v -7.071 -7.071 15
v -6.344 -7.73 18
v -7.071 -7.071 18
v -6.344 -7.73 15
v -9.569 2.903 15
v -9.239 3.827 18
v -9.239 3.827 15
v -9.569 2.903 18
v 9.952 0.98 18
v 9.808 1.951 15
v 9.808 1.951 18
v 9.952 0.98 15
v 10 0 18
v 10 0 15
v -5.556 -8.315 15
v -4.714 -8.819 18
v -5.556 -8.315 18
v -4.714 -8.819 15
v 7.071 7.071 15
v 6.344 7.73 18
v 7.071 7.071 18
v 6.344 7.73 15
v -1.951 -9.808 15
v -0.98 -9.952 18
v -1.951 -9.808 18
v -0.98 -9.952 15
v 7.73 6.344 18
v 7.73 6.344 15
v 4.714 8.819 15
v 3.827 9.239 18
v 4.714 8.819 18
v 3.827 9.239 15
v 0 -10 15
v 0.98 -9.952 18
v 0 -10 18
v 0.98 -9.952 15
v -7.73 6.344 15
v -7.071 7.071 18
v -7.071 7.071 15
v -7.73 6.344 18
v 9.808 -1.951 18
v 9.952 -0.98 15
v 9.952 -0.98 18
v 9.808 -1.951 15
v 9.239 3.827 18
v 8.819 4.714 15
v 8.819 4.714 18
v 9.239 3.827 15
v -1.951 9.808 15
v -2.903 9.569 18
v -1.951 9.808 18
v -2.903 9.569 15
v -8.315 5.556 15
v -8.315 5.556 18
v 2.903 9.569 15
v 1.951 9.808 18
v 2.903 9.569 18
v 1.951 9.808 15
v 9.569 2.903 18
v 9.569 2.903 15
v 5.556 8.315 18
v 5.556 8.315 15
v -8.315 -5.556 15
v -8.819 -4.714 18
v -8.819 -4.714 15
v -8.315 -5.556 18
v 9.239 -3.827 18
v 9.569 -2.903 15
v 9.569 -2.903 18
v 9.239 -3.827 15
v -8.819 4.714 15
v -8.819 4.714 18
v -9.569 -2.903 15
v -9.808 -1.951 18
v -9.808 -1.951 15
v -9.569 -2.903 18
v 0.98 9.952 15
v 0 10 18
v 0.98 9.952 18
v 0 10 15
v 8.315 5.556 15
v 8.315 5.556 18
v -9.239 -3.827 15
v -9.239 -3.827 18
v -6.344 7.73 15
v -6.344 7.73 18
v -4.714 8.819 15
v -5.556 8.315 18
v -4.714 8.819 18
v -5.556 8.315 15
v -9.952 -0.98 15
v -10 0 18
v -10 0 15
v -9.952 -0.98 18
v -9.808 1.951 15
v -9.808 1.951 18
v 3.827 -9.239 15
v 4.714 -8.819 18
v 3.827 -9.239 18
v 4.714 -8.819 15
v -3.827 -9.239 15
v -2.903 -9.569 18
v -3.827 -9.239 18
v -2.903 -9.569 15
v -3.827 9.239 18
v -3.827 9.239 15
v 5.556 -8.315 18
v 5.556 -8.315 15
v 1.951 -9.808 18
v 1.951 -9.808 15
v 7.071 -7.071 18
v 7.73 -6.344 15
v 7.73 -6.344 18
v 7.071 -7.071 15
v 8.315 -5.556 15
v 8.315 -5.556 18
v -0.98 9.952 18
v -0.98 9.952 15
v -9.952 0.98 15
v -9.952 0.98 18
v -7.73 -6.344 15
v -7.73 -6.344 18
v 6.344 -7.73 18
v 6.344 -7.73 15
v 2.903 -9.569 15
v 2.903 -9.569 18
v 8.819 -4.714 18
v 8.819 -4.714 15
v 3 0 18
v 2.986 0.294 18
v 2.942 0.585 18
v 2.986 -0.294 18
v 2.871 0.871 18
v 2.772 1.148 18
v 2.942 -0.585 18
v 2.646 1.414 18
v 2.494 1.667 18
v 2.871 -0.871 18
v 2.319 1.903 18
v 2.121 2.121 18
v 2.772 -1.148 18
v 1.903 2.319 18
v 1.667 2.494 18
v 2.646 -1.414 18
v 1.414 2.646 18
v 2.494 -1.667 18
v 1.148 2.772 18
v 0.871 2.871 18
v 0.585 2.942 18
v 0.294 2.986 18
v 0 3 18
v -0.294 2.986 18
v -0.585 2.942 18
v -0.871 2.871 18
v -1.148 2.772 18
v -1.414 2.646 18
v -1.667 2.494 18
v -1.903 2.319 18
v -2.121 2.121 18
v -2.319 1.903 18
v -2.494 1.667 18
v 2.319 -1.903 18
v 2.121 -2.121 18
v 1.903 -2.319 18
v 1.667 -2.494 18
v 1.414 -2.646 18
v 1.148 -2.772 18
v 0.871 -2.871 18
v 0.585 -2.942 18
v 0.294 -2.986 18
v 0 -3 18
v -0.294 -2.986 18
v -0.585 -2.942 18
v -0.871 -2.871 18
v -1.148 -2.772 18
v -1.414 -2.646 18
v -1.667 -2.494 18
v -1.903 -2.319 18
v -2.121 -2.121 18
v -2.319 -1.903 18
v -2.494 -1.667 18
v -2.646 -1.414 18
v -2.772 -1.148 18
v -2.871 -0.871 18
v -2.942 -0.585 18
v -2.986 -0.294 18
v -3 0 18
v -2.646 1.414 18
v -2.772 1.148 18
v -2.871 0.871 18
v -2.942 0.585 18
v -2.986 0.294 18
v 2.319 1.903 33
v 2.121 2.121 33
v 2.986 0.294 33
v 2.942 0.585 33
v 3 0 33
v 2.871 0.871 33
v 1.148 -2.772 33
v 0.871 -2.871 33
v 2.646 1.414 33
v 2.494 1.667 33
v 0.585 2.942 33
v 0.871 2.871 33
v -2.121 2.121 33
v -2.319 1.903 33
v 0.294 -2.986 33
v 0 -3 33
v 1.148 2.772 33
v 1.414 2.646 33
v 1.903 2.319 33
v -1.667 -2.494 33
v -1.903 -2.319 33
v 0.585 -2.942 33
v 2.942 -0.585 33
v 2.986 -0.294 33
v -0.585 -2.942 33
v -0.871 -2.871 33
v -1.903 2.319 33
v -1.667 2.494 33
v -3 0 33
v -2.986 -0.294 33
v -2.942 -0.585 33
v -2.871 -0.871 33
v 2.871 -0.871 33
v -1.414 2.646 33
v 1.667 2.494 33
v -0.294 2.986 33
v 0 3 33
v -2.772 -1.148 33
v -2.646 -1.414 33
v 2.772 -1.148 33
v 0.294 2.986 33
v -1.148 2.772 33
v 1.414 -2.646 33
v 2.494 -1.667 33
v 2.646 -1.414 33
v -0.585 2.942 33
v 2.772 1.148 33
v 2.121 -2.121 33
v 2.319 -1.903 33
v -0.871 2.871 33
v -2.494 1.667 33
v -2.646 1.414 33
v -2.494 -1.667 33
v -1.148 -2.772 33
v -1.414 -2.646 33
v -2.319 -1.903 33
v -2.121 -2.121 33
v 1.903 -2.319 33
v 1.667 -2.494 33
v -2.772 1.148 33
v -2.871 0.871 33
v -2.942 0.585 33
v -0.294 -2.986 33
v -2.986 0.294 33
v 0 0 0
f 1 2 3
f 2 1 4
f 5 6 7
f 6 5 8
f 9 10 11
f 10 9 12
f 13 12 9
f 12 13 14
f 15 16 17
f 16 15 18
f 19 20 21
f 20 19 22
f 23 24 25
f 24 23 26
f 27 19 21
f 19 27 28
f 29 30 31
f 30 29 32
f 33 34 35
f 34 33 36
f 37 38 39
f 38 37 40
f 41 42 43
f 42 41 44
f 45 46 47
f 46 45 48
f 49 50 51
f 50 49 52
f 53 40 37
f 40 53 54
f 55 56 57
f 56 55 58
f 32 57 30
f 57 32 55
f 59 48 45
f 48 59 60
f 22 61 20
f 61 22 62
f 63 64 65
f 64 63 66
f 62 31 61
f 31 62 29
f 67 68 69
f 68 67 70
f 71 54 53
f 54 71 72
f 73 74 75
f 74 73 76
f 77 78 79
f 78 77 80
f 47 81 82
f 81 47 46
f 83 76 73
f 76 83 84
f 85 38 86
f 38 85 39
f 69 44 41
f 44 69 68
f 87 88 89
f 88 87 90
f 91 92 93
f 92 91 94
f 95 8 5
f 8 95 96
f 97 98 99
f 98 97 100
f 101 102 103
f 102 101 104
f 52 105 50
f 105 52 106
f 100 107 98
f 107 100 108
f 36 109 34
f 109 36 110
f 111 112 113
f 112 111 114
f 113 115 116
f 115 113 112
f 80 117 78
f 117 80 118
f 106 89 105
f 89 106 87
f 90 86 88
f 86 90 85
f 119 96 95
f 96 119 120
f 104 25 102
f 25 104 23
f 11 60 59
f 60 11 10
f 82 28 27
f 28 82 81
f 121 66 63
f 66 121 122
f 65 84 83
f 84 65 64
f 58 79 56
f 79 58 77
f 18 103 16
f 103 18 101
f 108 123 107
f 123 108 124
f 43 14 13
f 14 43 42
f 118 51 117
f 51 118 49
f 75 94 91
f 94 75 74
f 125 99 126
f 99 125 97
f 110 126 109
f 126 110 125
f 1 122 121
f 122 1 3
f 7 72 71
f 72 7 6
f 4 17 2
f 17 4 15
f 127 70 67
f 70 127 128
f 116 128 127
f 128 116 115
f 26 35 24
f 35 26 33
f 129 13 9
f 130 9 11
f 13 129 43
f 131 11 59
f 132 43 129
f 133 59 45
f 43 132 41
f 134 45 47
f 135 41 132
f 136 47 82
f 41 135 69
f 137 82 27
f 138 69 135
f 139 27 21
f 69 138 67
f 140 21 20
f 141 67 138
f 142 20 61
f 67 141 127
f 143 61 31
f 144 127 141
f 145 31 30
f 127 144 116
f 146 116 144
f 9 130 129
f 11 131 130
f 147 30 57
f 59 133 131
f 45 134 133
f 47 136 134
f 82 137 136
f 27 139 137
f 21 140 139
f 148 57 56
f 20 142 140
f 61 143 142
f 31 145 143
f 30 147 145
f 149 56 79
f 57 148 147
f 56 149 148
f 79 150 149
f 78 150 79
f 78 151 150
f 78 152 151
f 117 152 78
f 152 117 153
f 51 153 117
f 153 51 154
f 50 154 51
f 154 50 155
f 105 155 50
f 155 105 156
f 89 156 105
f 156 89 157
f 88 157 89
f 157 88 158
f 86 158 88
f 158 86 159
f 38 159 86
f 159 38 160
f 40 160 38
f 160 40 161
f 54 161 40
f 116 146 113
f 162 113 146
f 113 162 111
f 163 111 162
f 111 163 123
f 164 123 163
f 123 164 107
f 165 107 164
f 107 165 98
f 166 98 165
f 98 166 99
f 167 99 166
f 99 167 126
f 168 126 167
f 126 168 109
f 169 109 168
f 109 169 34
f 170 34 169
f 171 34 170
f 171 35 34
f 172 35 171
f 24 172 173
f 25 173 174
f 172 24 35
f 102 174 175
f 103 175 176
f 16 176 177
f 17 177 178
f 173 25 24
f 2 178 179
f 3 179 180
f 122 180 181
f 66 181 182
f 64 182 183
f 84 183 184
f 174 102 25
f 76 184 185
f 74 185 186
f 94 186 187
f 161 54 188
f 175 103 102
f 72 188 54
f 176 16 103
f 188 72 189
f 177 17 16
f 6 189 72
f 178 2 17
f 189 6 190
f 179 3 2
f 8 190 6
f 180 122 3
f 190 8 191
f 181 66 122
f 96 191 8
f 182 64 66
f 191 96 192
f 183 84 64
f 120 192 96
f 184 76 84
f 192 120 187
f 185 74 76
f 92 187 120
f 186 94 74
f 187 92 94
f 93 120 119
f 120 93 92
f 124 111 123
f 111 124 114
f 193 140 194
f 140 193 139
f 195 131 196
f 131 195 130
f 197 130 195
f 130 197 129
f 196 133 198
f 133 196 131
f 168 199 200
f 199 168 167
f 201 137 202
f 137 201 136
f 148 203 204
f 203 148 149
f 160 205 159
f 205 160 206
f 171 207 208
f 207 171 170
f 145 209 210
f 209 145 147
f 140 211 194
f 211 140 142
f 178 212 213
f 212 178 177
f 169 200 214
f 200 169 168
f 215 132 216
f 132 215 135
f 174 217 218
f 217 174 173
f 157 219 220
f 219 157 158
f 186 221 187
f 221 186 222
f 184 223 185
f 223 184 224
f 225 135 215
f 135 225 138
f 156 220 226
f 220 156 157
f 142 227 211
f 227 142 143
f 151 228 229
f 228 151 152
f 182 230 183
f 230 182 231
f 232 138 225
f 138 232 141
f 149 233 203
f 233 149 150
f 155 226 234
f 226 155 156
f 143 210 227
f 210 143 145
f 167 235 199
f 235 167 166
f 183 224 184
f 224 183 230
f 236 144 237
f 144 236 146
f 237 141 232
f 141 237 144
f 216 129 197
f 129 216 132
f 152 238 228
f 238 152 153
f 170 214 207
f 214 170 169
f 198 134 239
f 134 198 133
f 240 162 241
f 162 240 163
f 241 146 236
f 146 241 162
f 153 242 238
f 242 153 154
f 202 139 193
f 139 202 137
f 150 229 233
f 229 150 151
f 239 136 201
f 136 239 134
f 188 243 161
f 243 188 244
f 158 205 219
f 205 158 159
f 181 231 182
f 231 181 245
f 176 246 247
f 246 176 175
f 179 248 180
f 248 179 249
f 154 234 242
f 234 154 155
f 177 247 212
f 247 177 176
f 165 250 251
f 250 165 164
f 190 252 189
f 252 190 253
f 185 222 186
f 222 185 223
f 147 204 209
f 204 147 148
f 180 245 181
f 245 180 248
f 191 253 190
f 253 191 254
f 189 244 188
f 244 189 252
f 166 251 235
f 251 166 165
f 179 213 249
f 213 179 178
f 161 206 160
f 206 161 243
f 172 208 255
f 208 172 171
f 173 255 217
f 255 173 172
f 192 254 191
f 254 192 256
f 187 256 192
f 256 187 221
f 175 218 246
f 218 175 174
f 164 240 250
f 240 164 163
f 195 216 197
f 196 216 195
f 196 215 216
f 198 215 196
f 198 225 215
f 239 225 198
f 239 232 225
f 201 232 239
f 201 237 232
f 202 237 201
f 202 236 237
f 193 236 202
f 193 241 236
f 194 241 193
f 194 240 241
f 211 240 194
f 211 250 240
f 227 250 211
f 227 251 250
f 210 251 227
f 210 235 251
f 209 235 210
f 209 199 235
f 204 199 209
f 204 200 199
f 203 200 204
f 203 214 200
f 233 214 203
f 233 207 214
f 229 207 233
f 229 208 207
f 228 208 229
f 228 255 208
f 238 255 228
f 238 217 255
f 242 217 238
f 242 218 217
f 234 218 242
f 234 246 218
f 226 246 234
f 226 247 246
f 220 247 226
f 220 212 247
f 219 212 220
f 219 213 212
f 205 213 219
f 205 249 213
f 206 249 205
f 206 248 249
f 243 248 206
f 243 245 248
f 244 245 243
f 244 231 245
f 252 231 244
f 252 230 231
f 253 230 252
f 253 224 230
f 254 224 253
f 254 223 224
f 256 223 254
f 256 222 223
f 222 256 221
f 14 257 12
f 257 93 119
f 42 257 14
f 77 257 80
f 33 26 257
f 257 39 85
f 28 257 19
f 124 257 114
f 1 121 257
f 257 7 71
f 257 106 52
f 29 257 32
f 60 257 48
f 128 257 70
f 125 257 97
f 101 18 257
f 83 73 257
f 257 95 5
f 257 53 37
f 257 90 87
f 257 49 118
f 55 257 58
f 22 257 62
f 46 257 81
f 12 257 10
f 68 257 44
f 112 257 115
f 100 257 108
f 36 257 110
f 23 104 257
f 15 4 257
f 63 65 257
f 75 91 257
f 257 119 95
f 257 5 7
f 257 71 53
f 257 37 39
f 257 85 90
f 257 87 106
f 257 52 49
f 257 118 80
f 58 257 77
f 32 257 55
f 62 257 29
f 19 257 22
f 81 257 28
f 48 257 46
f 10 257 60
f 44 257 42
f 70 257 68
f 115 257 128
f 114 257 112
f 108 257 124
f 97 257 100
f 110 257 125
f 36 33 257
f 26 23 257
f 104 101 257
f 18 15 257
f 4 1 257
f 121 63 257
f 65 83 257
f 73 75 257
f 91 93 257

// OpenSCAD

//######################VARIBLES#####################
//handle properties

//handle height
handle_height = 15;
//handle diamater
handle_diamater = 6;

//(optional) cylinder flywheel

//use flywheel
flywheel = "on";//[on, off]
//flywheel height
flywheel_height = 3;
//flywheel diamater
flywheel_diamater = 20;

//cone (can act as flywheel)

//cone height
cone_height = 15;
//cone diamater
cone_top_diamater = 20;

//seperate objects(for supportless printing)
seperate = "off";//[on,off]

//seperation distance
sep_dist = 10;
//joiner
join = "clip";//[none, pin, clip]
//joiner width
join_d = 4;
//joiner length
join_l = 5;
//tolerance(free space left in joiner, good if your pritner isnt accurate)
tolerance = 0.1;

//accuracy
$fn=64;
//#################END OF VARIABLES##################

//converting units
handle_r = handle_diamater/2;
flywheel_r = flywheel_diamater/2;
cone_top_r = cone_top_diamater/2;
join_r = join_d/2;

//simple old code, no seperation
if (seperate == "off")
{
	//bottom cone
	cylinder(cone_height, 0, cone_top_r);
	
	//different behaviour with and without flywheel
	if(flywheel == "on")
	{
		//flywheel
		translate([0,0,cone_height]) cylinder(flywheel_height, flywheel_r, flywheel_r);
		//handle
		translate([0,0,cone_height+flywheel_height]) cylinder(handle_height, handle_r, handle_r);
	}
	else
	{
		translate([0,0,cone_height]) cylinder(handle_height, handle_r, handle_r);
	}
}
else//seperate code
{
		//handle
	cylinder(handle_height, handle_r, handle_r);
	//joiner
	translate([0,0,handle_height])joiner();
	//different logic needed with and without flywheel
	if(flywheel == "on")
	{	
		//is the cone or flywheel larger
		if(flywheel_r > cone_top_r)
		{	
			difference()
			{
				//make flywheel/cone into one object
				union()	
				{
					//make flywheel
					translate([handle_r+flywheel_r+sep_dist,0,0]) cylinder(flywheel_height, flywheel_r, flywheel_r);
					//make cone
					translate([handle_r+flywheel_r+sep_dist,0,flywheel_height]) cylinder(cone_height,cone_top_r, 0);
				}
				translate([handle_r+flywheel_r+sep_dist,0,0])joiner("female");
			}
		
		}
		else
		{	
			echo("WARNING : cone bigger than flywheel, overhang inevitable!!!!!!(unless the overhang is very small, you should inspect the model before use)");
			difference()
			{
				//make flywheel/cone into one object
				union()	
				{
					//make flywheel
					translate([handle_r+cone_top_r+sep_dist,0,0]) cylinder(flywheel_height, flywheel_r, flywheel_r);
					//make cone
					translate([handle_r+cone_top_r+sep_dist,0,flywheel_height]) cylinder(cone_height,cone_top_r, 0);
				}
				translate([handle_r+cone_top_r+sep_dist,0,0])joiner("female");
			}
		}
	}
	else
	{
		//put clip/pin hole in cone
		difference()
			{
				//make cone
				translate([handle_r+cone_top_r+sep_dist,0,0]) cylinder(cone_height,cone_top_r, 0);
				translate([handle_r+cone_top_r+sep_dist,0,0])joiner("female");
			}
	}
}

//simple place for all joiners(used to be repeated many times)
module joiner(gen = "male", type = join, joinerl = join_l, joinerr = join_r, tol = tolerance)
{
	//male clip
	if (gen == "male")
	{
		if(type == "pin")
		{
			//simple cylinder pin	
			cylinder(joinerl,joinerr,joinerr);
		}
		if(type == "clip")
		{
			//press clip
			difference()
			{
				//start with pin shaped cylinder
				cylinder(joinerl,joinerr,joinerr);
				difference()
				{
					//create mask to remove narrow portion
					//start with a larger shorter cylinder, then hollow out the middle
					translate([0,0,-1]) cylinder(joinerl*0.7+1,joinerr*1.1,joinerr*1.1);
					translate([0,0,-1]) cylinder(joinerl*0.7+1,joinerr*0.8,joinerr*0.8);
				}
				difference()
				{
					//bevel on top for easy use
					//mask made with large cylinder, then subtracting bevel shape using cone cylinder
					translate([0,0,joinerl*0.8]) cylinder(joinerl,joinerr*1.1,joinerr);
					translate([0,0,joinerl*0.8]) cylinder(joinerl*0.7,joinerr,0);
				}
				//take out slice in middle
				translate([0-joinerr*1.1,0-joinerr*0.3,joinerl*0.2]) cube([joinerr*2.2,joinerr*0.6, joinerl*1.1]);
				//trim the sides to make them flat, anti spin, ease of use
				translate([0-joinerr*1.05,0-joinerr,0-joinerl*0.05]) cube([joinerr*0.3,joinerr*2,joinerl*1.1]);
				translate([joinerr*0.75,0-joinerr,0-joinerl*0.05]) cube([joinerr*0.3,joinerr*2,joinerl*1.1]);
			}
		}
	}
	//female mask, to subtract
	if(gen == "female")
	{
		if(type == "pin")
		{
			translate([0,0,0])cylinder(joinerl+tol,joinerr+tol,joinerr+tol);
		}
		if(type == "clip")
		{
			difference()
			{
				//start with pin shaped cylinder, bigger for tolerance
				cylinder(joinerl+tol,joinerr+tol,joinerr+tol);
				difference()
				{
					//create mask to remove narrow portion, with more tolerance	
					//start with a larger shorter cylinder, then hollow out the middle
					cylinder(joinerl*0.7-tol,joinerr*1.1+tol,joinerr*1.1+tol);
					cylinder(joinerl*0.7-tol,joinerr*0.8+tol,joinerr*0.8+tol);
				}
				//trim the sides to make them flat, anti spin, ease of use
				translate([0-joinerr*1.05-tol,0-joinerr,0-joinerl*0.05]) cube([joinerr*0.3,joinerr*2,joinerl*1.1]);
				translate([joinerr*0.75+tol,0-joinerr,0-joinerl*0.05]) cube([joinerr*0.3,joinerr*2,joinerl*1.1]);
			}
		}
	}
}
